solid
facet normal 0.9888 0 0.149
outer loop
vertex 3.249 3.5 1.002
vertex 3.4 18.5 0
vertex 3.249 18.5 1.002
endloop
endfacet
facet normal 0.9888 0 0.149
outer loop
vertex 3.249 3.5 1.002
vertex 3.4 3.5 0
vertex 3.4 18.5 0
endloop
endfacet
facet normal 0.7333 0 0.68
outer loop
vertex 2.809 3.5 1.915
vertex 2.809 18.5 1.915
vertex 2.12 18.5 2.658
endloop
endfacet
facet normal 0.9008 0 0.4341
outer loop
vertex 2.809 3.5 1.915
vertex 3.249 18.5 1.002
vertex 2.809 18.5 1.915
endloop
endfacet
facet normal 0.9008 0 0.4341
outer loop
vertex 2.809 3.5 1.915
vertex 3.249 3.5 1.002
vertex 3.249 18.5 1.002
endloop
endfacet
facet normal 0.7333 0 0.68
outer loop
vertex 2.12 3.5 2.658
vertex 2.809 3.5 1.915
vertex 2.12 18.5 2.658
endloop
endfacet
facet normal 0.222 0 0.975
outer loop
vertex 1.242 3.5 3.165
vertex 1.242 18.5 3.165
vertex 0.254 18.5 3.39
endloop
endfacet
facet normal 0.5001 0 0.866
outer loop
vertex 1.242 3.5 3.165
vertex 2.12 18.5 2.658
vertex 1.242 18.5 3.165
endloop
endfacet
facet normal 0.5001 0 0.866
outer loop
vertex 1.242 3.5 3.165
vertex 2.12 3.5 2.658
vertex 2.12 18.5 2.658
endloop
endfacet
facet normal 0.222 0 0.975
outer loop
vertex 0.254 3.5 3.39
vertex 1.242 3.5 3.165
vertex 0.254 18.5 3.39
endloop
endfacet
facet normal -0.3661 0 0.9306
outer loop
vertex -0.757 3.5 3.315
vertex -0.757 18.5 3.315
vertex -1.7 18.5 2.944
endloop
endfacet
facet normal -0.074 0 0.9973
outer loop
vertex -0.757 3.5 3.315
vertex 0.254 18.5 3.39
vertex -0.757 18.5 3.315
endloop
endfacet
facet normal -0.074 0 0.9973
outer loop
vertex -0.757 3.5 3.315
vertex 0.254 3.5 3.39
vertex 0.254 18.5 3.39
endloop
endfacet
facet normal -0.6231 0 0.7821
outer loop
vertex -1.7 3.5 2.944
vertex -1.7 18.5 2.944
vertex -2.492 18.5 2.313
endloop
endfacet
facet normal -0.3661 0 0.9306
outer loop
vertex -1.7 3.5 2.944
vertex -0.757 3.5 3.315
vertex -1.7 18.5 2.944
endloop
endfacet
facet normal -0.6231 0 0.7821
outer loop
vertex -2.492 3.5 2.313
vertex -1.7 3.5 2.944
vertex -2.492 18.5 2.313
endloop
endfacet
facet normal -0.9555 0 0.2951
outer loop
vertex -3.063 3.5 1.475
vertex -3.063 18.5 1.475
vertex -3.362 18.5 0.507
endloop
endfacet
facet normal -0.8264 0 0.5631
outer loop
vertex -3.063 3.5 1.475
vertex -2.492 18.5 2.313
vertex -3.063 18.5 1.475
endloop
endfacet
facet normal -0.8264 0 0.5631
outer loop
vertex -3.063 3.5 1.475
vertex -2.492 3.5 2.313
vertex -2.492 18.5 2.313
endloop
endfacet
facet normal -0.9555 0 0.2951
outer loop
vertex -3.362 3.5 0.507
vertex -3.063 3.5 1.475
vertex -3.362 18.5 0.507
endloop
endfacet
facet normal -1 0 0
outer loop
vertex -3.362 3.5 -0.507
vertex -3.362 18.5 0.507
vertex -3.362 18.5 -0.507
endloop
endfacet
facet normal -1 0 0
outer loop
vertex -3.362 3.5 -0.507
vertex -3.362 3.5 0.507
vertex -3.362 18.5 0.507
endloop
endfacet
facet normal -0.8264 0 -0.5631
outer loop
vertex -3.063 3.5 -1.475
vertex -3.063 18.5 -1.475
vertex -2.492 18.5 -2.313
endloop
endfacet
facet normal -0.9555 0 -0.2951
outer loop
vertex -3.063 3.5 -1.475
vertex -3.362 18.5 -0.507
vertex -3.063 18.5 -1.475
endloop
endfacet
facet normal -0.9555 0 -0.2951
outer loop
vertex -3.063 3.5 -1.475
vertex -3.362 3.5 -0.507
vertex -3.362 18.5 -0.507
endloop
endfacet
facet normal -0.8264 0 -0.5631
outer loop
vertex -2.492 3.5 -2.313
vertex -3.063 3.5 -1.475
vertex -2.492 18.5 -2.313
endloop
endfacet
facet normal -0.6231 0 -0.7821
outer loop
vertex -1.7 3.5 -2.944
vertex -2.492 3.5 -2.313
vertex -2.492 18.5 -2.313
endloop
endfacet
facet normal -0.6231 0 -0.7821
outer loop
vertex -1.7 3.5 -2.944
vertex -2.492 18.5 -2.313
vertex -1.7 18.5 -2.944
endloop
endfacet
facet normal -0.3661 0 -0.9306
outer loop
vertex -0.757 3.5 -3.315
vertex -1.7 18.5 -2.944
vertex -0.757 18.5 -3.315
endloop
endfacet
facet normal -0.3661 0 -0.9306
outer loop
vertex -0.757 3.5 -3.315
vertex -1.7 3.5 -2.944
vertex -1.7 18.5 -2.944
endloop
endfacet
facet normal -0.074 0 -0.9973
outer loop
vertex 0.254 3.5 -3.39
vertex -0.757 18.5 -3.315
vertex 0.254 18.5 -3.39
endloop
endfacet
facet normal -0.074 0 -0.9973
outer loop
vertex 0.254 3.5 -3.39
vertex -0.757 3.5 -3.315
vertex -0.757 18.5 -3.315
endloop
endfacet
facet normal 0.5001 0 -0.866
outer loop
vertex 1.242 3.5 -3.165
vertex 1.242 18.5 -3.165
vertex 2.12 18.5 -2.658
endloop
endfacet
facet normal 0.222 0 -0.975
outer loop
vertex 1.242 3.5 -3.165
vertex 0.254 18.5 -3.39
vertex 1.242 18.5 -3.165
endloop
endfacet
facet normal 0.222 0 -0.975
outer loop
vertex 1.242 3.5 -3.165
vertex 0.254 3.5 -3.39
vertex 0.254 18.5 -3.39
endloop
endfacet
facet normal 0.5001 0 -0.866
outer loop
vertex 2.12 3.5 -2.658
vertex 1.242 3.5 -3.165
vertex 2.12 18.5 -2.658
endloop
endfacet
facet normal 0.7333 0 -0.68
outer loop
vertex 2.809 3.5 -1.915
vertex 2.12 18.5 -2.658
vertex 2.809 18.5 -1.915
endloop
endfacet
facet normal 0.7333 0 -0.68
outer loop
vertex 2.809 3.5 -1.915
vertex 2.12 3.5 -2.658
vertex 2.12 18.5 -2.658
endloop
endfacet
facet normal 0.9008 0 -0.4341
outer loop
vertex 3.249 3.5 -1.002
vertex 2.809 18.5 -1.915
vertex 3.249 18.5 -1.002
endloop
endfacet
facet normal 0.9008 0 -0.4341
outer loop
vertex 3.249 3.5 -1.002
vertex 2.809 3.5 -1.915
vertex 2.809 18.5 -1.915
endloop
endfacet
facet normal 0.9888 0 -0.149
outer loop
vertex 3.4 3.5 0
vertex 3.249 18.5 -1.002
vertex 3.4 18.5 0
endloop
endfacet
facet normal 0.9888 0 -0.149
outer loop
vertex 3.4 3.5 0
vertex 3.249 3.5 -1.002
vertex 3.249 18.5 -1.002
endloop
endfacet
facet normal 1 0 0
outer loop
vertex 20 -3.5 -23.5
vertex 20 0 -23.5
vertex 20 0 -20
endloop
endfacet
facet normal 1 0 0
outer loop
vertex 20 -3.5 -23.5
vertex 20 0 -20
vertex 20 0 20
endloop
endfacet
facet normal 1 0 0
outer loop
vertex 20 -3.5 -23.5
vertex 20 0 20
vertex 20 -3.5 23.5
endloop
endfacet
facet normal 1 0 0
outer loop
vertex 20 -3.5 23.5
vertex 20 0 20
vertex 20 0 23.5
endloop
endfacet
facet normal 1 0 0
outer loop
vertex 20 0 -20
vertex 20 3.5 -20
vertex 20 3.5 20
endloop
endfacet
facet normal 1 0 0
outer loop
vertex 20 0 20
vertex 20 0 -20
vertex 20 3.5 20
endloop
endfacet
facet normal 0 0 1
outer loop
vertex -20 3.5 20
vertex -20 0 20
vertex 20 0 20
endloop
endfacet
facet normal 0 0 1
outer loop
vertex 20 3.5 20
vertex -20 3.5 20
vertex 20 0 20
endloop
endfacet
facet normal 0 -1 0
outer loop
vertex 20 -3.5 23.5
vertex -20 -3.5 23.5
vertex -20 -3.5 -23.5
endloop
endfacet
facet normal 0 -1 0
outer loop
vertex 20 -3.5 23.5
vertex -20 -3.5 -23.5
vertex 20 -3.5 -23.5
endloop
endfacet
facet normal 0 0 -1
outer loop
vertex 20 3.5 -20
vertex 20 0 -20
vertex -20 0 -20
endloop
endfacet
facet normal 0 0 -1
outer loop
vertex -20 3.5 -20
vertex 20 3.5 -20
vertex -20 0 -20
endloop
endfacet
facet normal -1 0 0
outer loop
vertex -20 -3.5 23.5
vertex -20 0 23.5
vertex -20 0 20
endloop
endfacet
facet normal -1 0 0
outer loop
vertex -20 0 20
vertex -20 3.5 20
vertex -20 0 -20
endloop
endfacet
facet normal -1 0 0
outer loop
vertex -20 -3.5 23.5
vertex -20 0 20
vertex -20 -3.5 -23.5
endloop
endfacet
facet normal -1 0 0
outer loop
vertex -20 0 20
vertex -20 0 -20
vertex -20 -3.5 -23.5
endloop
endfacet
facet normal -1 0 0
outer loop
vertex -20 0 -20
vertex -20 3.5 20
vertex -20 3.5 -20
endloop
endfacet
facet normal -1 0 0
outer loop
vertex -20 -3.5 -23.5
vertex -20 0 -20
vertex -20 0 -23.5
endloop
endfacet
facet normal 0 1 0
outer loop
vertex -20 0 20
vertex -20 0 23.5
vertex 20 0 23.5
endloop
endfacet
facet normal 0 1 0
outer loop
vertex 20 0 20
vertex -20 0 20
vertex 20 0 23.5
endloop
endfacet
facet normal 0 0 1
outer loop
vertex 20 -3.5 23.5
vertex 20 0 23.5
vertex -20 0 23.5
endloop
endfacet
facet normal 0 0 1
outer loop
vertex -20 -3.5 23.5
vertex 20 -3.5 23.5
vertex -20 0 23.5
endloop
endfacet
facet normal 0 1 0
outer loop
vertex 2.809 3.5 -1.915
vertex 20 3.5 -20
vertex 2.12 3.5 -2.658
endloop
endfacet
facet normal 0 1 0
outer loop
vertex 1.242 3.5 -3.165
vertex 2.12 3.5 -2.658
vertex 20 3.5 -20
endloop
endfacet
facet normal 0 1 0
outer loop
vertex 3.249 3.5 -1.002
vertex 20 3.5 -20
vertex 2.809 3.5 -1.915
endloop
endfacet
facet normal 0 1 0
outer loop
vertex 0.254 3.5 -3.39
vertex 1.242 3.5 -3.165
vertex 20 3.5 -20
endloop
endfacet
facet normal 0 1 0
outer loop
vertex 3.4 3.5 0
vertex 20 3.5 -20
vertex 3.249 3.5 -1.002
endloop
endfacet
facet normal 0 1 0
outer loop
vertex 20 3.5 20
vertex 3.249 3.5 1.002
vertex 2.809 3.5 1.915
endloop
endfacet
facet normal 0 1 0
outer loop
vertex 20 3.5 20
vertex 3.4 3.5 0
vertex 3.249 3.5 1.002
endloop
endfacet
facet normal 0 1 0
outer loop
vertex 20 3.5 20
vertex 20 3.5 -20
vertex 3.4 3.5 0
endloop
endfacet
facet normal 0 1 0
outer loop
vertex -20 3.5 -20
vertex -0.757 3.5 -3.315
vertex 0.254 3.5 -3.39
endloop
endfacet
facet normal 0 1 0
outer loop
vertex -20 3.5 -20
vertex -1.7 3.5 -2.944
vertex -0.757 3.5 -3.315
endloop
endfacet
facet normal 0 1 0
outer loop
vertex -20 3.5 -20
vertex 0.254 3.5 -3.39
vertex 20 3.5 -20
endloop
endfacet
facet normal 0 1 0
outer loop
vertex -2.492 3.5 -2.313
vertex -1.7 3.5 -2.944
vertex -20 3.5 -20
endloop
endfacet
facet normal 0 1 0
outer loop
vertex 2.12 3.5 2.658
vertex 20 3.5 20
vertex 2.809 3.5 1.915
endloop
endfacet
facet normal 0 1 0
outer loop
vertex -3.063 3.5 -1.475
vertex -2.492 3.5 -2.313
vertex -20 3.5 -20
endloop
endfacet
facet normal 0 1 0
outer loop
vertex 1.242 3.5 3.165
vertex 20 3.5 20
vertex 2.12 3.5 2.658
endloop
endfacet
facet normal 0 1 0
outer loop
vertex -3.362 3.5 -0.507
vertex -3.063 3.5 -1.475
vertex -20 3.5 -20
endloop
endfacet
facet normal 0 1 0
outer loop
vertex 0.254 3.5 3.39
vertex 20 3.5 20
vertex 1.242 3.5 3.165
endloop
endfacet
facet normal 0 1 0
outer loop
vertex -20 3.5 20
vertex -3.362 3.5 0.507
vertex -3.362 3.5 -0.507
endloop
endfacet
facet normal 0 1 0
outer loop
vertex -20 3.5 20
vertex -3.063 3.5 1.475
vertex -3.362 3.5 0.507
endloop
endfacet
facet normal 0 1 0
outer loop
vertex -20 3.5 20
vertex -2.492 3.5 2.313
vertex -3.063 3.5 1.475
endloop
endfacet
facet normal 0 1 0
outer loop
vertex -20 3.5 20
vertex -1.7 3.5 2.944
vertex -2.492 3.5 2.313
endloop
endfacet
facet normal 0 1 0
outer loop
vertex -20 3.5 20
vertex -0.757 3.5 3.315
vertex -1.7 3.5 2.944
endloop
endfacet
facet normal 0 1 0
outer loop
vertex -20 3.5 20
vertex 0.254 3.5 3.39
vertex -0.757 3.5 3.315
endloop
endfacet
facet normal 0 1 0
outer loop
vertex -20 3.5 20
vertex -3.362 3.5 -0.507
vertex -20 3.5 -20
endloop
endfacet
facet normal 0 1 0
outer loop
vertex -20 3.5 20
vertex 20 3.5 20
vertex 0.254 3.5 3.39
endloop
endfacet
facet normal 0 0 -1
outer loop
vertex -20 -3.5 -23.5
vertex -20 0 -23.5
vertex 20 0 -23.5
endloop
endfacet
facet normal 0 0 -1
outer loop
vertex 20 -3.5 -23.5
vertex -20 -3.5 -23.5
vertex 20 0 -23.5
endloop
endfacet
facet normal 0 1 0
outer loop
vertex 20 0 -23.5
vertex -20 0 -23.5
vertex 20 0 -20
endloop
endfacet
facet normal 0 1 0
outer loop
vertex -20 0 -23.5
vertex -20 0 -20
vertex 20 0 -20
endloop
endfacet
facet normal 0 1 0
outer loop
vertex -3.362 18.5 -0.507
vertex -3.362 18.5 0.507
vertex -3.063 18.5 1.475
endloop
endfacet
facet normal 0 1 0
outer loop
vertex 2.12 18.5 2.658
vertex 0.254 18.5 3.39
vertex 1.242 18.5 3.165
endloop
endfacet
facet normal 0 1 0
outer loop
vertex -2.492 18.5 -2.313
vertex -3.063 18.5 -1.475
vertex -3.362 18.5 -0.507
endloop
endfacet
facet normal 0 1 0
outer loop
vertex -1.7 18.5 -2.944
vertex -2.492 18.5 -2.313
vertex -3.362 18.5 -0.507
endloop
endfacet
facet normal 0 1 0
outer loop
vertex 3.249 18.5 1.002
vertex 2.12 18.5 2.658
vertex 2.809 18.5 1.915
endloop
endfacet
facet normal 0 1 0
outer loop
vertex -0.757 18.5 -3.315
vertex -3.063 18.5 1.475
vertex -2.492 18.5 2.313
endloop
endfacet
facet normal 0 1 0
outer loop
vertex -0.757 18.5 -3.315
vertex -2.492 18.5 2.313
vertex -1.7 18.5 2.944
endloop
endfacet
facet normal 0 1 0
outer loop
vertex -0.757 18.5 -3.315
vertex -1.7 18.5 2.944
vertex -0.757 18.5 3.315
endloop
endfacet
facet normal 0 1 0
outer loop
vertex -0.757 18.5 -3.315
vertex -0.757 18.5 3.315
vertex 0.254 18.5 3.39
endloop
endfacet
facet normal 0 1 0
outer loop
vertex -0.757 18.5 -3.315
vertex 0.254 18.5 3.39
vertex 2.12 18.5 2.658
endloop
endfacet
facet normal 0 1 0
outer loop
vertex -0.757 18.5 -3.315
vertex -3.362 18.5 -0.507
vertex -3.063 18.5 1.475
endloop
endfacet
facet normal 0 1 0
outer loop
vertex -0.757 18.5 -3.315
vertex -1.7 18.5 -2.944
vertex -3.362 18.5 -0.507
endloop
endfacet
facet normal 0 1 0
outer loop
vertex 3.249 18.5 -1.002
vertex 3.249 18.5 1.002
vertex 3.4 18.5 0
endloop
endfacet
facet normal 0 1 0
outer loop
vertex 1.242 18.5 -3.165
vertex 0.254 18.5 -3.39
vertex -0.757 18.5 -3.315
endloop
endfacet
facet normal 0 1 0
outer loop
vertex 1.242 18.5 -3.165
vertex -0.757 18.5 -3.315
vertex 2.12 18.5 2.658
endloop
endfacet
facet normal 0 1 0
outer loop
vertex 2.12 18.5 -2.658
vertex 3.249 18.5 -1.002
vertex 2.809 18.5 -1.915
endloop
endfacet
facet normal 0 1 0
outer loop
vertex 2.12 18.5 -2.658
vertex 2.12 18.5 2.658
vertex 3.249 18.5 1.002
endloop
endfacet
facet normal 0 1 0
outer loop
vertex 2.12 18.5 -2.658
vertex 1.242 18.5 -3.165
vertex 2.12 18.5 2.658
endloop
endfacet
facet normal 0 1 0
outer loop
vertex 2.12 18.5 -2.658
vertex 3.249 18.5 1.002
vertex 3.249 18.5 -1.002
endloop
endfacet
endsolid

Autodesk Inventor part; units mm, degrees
ref_plane "YZ Plane" through (0, 0, 0) normal (1, 0, 0) x (0, 1, 0)
ref_plane "XZ Plane" through (0, 0, 0) normal (0, 1, 0) x (-1, 0, 0)
ref_plane "XY Plane" through (0, 0, 0) normal (0, 0, 1) x (1, 0, 0)
sketch "Sketch1" plane through (0, 0, 0) normal (0, 1, 0) x (-1, 0, 0)
  line L0 (20, 20) -> (-20, 20)
  line L1 (-20, 20) -> (-20, -20)
  line L2 (-20, -20) -> (20, -20)
  line L3 (20, -20) -> (20, 20)
  point P0 (0, 0)
  point P1 (20, 0)
  point P2 (0, -20)
  dimension "d0" = 40
  dimension "d1" = 40
extrude "Extrusion1" add sketch "Sketch1" along normal blind 3.5
sketch "Sketch2" plane through (0, 0, 0) normal (0, -1, 0) x (1, 0, 0)
  line L0 (20, 23.5) -> (-20, 23.5)
  line L1 (-20, 23.5) -> (-20, -23.5)
  line L2 (-20, -23.5) -> (20, -23.5)
  line L3 (20, -23.5) -> (20, 23.5)
  line L4 (20, 20) -> (20, -20) projected
  line L5 (20, -20) -> (-20, -20) projected
  point P0 (0, 0)
  point P1 (0, -23.5)
  point P2 (20, 0)
  dimension "d5" = 3.5
extrude "Extrusion2" add sketch "Sketch2" along normal blind 3.5
sketch "Sketch3" plane through (0, 3.5, 0) normal (0, 1, 0) x (1, 0, 0)
  line L0 (-12.5, 12.5) -> (12.5, 12.5)
  line L1 (12.5, 12.5) -> (12.5, -12.5)
  line L2 (12.5, -12.5) -> (-12.5, -12.5)
  line L3 (-12.5, -12.5) -> (-12.5, 12.5)
  circle A0 centre (0, 0) radius 3.4
  point P0 (12.5, 0)
  point P1 (0, 12.5)
  dimension "d8" = 25
  dimension "d9" = 25
  dimension "d12" = 6.8
extrude "Extrusion4" add sketch "Sketch3" along normal blind 15 contours A0
properties part number "Einschub"
